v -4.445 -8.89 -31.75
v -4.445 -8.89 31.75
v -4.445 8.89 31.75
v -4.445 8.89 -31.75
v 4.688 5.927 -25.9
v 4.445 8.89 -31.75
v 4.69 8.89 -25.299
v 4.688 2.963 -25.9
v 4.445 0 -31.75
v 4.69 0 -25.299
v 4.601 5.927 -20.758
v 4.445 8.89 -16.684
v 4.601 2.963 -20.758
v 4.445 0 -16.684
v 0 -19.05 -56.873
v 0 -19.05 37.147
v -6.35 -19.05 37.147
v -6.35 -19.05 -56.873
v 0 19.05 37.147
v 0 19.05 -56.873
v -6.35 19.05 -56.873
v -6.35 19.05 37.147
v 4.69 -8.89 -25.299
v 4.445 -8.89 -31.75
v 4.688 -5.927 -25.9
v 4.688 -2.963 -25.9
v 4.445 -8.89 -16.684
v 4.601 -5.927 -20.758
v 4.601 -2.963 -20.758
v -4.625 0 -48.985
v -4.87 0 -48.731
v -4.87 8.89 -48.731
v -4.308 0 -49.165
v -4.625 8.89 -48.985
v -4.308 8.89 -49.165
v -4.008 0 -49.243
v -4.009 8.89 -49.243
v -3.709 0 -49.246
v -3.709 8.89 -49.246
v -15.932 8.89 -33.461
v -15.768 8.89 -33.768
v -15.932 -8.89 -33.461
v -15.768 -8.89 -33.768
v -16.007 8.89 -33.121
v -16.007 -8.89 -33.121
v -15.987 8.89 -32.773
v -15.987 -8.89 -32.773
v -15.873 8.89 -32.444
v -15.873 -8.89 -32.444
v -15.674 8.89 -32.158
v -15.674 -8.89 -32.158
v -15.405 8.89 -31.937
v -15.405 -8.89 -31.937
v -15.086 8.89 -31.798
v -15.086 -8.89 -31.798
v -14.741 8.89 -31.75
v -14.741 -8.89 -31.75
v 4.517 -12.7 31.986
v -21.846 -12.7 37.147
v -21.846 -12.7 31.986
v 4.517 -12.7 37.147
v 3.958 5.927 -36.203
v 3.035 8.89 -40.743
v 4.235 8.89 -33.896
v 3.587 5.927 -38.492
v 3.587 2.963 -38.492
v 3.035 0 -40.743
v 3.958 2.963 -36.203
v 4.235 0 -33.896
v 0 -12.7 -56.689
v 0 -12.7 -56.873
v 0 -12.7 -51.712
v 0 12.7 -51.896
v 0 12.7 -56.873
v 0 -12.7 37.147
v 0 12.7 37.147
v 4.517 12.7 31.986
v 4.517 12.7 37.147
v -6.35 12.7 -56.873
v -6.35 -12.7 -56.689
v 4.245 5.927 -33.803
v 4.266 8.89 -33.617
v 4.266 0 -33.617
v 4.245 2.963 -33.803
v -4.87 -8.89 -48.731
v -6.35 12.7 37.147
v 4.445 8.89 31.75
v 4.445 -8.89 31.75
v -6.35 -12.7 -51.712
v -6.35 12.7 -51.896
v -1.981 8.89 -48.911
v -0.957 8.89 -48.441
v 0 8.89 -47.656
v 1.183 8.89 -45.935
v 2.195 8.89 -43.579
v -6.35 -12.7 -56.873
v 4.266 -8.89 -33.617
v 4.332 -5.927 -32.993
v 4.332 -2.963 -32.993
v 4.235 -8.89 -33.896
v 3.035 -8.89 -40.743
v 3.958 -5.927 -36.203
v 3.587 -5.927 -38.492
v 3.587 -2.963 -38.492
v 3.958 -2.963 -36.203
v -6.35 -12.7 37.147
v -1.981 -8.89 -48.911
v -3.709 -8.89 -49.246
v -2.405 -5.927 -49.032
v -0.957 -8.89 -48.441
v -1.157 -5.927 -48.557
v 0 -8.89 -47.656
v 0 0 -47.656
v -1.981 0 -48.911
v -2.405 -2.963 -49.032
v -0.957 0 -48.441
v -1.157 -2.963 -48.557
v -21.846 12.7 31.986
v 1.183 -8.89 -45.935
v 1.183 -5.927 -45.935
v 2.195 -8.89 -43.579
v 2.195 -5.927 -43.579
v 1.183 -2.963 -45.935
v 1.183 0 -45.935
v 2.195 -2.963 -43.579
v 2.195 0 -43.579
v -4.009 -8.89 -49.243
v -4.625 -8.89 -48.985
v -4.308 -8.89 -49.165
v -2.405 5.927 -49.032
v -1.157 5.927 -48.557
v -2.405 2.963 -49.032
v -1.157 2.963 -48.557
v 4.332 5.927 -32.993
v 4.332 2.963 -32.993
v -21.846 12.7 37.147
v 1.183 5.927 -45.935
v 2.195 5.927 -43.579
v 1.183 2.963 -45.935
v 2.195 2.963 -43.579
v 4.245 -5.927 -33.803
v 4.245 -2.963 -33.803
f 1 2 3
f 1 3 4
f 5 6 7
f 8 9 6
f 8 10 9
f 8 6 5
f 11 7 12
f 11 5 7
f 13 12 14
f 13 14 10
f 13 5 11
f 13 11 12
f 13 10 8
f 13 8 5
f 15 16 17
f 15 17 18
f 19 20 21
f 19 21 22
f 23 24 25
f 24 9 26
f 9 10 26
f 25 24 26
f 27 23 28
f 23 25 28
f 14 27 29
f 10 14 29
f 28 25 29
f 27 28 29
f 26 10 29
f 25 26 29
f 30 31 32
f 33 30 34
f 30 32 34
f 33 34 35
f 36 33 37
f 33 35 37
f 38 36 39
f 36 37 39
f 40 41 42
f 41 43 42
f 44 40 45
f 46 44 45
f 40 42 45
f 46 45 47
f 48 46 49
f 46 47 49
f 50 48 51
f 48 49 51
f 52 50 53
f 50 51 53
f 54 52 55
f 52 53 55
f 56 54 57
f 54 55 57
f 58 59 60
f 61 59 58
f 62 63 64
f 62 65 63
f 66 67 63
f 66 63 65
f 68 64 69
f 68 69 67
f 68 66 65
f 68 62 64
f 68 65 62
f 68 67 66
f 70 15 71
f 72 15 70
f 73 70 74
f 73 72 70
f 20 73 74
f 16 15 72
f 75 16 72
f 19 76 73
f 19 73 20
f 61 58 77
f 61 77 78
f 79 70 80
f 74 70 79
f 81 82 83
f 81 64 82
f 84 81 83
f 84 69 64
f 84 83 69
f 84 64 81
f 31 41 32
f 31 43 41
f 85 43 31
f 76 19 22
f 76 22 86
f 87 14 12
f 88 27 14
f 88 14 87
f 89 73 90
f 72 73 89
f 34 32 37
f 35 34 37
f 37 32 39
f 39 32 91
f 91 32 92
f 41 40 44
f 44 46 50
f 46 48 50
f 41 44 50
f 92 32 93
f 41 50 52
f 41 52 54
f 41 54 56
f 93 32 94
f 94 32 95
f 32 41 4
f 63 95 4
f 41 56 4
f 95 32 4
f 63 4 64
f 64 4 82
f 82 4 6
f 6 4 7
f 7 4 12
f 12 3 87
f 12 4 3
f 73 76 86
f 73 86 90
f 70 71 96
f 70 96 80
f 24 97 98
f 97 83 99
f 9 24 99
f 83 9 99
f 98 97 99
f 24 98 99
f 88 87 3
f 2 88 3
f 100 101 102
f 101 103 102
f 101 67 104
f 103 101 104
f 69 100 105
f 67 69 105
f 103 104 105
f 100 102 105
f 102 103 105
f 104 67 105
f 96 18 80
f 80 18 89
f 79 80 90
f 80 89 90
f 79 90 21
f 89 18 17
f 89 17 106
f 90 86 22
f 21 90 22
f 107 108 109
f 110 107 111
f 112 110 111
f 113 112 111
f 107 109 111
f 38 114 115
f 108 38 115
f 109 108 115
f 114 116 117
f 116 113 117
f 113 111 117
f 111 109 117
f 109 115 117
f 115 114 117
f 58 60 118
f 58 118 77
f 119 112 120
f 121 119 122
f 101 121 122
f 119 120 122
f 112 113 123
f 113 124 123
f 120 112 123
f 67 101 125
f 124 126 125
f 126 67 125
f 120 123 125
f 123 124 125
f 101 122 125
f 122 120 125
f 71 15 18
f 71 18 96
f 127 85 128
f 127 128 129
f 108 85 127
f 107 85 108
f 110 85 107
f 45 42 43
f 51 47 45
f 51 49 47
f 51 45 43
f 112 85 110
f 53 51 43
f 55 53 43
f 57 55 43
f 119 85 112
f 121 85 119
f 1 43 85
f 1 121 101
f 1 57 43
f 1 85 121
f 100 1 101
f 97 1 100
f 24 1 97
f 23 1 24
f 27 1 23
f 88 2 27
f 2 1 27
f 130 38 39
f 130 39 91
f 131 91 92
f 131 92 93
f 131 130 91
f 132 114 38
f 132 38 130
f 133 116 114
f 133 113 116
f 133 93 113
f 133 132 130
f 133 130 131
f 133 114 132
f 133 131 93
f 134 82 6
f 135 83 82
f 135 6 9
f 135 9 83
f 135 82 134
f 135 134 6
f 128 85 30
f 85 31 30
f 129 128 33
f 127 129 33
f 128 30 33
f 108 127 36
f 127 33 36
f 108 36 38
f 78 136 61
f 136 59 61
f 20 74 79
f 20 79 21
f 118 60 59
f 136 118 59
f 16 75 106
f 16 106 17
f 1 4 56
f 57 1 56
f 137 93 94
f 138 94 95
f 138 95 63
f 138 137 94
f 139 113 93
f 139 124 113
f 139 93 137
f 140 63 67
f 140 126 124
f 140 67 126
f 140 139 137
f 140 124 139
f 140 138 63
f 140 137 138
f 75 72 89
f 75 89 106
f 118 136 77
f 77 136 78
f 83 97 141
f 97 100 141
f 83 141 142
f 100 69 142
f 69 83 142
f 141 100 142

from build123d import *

# Parameters (mm, degrees)
F1_DEPTH = 8.89
F2_R     = 1.27
F3_R     = 1.27
F4_W     = 26.3627418317
F4_H     = 5.1619373262
F5_DEPTH = 12.7
F7_DEPTH = 6.35


with BuildPart() as f1:
    # F0 (on Front) → F1 (new body, symmetric)
    with BuildSketch(Plane.XZ):
        with BuildLine():
            add(Edge.make_bspline(
                [(4.2661379753, -33.616950048), (4.3349248687, -32.99222106), (4.3945578489, -32.36840068), (4.445, -31.75)],
                knots=[0.4799922653, 0.4799922653, 0.4799922653, 0.4799922653, 0.5123717025, 0.5123717025, 0.5123717025, 0.5123717025], degree=3))
            Line((4.445, -31.75), (-4.445, -31.75))
            Line((-4.445, -31.75), (-17.2371771187, -31.75))
            Line((-17.2371771187, -31.75), (-4.445, -49.3149235845))
            add(Edge.make_bspline(
                [(-4.445, -49.3149235845), (-2.8737867331, -49.1791167069), (-1.3025734662, -49.0433098293), (0, -47.6557277143)],
                knots=[0, 0, 0, 0, 0.1787943452, 0.1787943452, 0.1787943452, 0.1787943452], degree=3))
            add(Edge.make_bspline(
                [(0, -47.6557277143), (1.1546532493, -45.3808190167), (2.3218615323, -43.1096212641), (3.0350551164, -40.743494961)],
                knots=[0, 0, 0, 0, 0.5053639981, 0.5053639981, 0.5053639981, 0.5053639981], degree=3))
            add(Edge.make_bspline(
                [(3.0350551164, -40.743494961), (3.5641678247, -38.6195342287), (3.9647615791, -36.2559041312), (4.2348473132, -33.8956672077)],
                knots=[0.3528810834, 0.3528810834, 0.3528810834, 0.3528810834, 0.4751777864, 0.4751777864, 0.4751777864, 0.4751777864], degree=3))
            add(Edge.make_bspline(
                [(4.2348473132, -33.8956672077), (4.2452843652, -33.8027605788), (4.2557060854, -33.7098530506), (4.2661379753, -33.616950048)],
                knots=[0.9808831842, 0.9808831842, 0.9808831842, 0.9808831842, 1, 1, 1, 1], degree=3))
        make_face()
        with BuildLine():
            Line((-4.445, -31.75), (4.445, -31.75))
            Line((4.445, -31.75), (4.445, -16.6841130704))
            add(Edge.make_bspline(
                [(4.445, -16.6841130704), (4.390455432, -14.8693285963), (4.417727716, -13.6566404294), (4.445, -12.4439522624)],
                knots=[0.830976746, 0.830976746, 0.830976746, 0.830976746, 1, 1, 1, 1], degree=3))
            Line((4.445, -12.4439522624), (4.445, 31.75))
            Line((4.445, 31.75), (-4.445, 31.75))
            Line((-4.445, 31.75), (-4.445, -31.75))
        make_face()
        with BuildLine():
            Line((4.445, -16.6841130704), (4.445, -31.75))
            add(Edge.make_bspline(
                [(4.445, -31.75), (4.9413373419, -25.665101898), (4.5478152875, -20.1049411089), (4.445, -16.6841130704)],
                knots=[0.5123717025, 0.5123717025, 0.5123717025, 0.5123717025, 0.830976746, 0.830976746, 0.830976746, 0.830976746], degree=3))
        make_face()
        with BuildLine():
            add(Edge.make_bspline(
                [(4.445, -16.6841130704), (4.390455432, -14.8693285963), (4.417727716, -13.6566404294), (4.445, -12.4439522624)],
                knots=[0.830976746, 0.830976746, 0.830976746, 0.830976746, 1, 1, 1, 1], degree=3))
            Line((4.445, -16.6841130704), (4.445, -12.4439522624))
        make_face()
        with BuildLine():
            add(Edge.make_bspline(
                [(4.2348473132, -33.8956672077), (4.2454798326, -33.802751286), (4.2559100938, -33.709840623), (4.2661379753, -33.616950048)],
                knots=[0.4751777864, 0.4751777864, 0.4751777864, 0.4751777864, 0.4799922653, 0.4799922653, 0.4799922653, 0.4799922653], degree=3))
            add(Edge.make_bspline(
                [(4.2348473132, -33.8956672077), (4.2452843652, -33.8027605788), (4.2557060854, -33.7098530506), (4.2661379753, -33.616950048)],
                knots=[0.9808831842, 0.9808831842, 0.9808831842, 0.9808831842, 1, 1, 1, 1], degree=3))
        make_face()
        with BuildLine():
            add(Edge.make_bspline(
                [(3.0350551164, -40.743494961), (3.7061302896, -38.5171027806), (3.9752319818, -36.2066631893), (4.2348473132, -33.8956672077)],
                knots=[0.5053639981, 0.5053639981, 0.5053639981, 0.5053639981, 0.9808831842, 0.9808831842, 0.9808831842, 0.9808831842], degree=3))
            add(Edge.make_bspline(
                [(3.0350551164, -40.743494961), (3.5641678247, -38.6195342287), (3.9647615791, -36.2559041312), (4.2348473132, -33.8956672077)],
                knots=[0.3528810834, 0.3528810834, 0.3528810834, 0.3528810834, 0.4751777864, 0.4751777864, 0.4751777864, 0.4751777864], degree=3))
        make_face()
        with BuildLine():
            add(Edge.make_bspline(
                [(0, -47.6557277143), (1.2682770572, -46.3046802631), (2.2818745053, -43.7669075859), (3.0350551164, -40.743494961)],
                knots=[0.1787943452, 0.1787943452, 0.1787943452, 0.1787943452, 0.3528810834, 0.3528810834, 0.3528810834, 0.3528810834], degree=3))
            add(Edge.make_bspline(
                [(0, -47.6557277143), (1.1546532493, -45.3808190167), (2.3218615323, -43.1096212641), (3.0350551164, -40.743494961)],
                knots=[0, 0, 0, 0, 0.5053639981, 0.5053639981, 0.5053639981, 0.5053639981], degree=3))
        make_face()
    extrude(amount=F1_DEPTH, both=True)

    # F2
    f2_edges = [f1.edges().sort_by_distance(p)[0] for p in [
        (-17.237177, 0, -31.75),
    ]]
    fillet(f2_edges, radius=F2_R)

    # F3
    f3_edges = [f1.edges().sort_by_distance(p)[0] for p in [
        (-4.445, 4.445, -49.314924),
        (-4.445, -4.445, -49.314924),
    ]]
    fillet(f3_edges, radius=F3_R)


with BuildPart() as f5:
    # F4 (on Front) → F5 (new body, symmetric)
    with BuildSketch(Plane.XZ):
        with Locations((-8.6646776181, 34.5665309578)):
            Rectangle(F4_W, F4_H)
    extrude(amount=F5_DEPTH, both=True)


with BuildPart() as f7:
    # F6 (on Right) → F7 (new body)
    with BuildSketch(Plane.YZ):
        Polygon((19.05, 37.1474996209), (12.7, 37.1474996209), (12.7, -51.8958903849), (12.7, -56.8734705448), (19.05, -56.8734705448), align=None)
        Polygon((12.7, -56.8734705448), (12.7, -51.8958903849), (-12.7, -51.7115332186), (-12.7, -56.6891133785), align=None)
        Polygon((-12.7, -56.6891133785), (-12.7, -51.7115332186), (-12.7, 37.1474996209), (-19.05, 37.1474996209), (-19.05, -56.8734705448), (-12.7, -56.8734705448), align=None)
    extrude(amount=-F7_DEPTH)


solid = Compound([f1.part, f5.part, f7.part])
